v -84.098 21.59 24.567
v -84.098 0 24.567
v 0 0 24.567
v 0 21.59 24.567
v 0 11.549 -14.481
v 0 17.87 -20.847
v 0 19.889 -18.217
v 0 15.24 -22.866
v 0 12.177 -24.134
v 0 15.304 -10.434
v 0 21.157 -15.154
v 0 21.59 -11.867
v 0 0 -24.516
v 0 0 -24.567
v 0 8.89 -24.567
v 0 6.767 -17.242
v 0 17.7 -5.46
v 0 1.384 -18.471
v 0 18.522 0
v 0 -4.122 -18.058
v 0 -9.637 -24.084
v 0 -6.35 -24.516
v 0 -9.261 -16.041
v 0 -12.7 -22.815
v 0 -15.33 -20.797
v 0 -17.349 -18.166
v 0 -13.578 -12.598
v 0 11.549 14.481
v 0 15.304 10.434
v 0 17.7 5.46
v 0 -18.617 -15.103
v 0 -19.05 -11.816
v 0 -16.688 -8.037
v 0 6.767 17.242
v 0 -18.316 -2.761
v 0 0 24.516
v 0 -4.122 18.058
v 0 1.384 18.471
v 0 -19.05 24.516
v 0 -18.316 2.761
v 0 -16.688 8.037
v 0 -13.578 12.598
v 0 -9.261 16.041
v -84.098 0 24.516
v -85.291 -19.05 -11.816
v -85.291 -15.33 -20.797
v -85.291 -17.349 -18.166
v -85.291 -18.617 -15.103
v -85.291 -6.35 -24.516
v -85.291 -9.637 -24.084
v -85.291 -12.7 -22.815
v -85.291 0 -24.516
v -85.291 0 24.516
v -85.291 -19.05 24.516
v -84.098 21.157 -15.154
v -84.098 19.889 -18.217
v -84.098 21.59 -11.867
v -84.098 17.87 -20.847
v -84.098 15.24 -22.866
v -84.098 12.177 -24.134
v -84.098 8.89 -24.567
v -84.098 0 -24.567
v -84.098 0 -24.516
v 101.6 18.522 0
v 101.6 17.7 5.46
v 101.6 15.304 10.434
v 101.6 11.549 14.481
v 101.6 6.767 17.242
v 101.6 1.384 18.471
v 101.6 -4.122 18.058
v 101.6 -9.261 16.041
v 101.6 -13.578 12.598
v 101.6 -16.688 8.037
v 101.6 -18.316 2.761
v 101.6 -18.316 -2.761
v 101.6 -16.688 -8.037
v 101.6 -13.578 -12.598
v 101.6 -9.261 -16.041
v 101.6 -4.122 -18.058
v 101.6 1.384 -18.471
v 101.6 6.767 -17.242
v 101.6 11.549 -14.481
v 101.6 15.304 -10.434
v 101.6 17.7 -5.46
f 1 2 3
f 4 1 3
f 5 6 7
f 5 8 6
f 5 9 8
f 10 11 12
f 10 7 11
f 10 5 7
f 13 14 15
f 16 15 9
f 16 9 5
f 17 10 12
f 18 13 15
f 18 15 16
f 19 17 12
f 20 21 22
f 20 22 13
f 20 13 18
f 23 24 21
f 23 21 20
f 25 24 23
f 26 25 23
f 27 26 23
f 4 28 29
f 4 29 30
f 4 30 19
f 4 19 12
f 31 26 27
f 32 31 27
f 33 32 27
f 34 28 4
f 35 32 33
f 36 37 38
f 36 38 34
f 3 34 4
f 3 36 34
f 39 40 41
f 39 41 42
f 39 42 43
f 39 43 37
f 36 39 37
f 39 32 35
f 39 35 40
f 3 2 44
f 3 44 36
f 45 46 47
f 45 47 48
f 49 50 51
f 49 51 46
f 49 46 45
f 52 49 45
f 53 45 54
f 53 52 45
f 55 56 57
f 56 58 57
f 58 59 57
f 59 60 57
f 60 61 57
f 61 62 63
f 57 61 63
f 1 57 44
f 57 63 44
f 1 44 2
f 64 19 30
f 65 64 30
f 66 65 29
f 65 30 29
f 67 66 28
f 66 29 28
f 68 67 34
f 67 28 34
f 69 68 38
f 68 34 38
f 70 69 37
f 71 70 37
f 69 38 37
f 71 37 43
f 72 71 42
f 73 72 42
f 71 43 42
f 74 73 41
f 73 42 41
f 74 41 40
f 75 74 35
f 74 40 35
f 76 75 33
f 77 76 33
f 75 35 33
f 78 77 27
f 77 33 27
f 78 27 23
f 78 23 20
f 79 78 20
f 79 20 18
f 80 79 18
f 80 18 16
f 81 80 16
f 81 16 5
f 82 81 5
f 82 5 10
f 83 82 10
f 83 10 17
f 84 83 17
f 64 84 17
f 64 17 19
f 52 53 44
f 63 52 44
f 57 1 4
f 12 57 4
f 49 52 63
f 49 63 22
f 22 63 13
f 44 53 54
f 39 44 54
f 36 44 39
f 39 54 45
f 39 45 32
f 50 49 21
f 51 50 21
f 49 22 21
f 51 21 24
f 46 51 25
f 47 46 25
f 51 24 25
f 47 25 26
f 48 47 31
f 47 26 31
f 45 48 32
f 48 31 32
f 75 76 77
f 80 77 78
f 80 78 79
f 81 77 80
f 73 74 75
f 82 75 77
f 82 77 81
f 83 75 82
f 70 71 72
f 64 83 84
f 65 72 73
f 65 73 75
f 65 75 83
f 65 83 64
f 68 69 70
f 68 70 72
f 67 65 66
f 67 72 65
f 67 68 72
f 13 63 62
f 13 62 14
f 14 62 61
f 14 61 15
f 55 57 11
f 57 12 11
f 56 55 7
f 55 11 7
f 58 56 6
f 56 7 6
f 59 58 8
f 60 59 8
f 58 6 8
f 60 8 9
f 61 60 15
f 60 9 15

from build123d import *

# Parameters (mm, degrees)
F0_R     = 18.522455
F1_DEPTH = 101.6
F3_W     = 85.290574
F3_H     = 49.032718
F4_DEPTH = 19.05
F2_W     = 84.098086
F2_H     = 49.134076
F5_DEPTH = 21.59
F6_R     = 12.7


with BuildPart() as f1:
    # F0 (on Right) → F1 (new body)
    with BuildSketch(Plane.YZ):
        Circle(F0_R)
    extrude(amount=F1_DEPTH)

    # F3 (on Front) → F4 (join)
    with BuildSketch(Plane.XZ):
        with Locations((-42.645287, 0)):
            Rectangle(F3_W, F3_H)
    extrude(amount=F4_DEPTH)

    # F2 (on Front) → F5 (join)
    with BuildSketch(Plane.XZ):
        with Locations((-42.049043, 0)):
            Rectangle(F2_W, F2_H)
    extrude(amount=-F5_DEPTH)

    # F6
    f6_edges = [f1.edges().sort_by_distance(p)[0] for p in [
        (-42.049043, 21.59, -24.567038),
        (-42.645287, -19.05, -24.516359),
    ]]
    fillet(f6_edges, radius=F6_R)


solid = f1.part
